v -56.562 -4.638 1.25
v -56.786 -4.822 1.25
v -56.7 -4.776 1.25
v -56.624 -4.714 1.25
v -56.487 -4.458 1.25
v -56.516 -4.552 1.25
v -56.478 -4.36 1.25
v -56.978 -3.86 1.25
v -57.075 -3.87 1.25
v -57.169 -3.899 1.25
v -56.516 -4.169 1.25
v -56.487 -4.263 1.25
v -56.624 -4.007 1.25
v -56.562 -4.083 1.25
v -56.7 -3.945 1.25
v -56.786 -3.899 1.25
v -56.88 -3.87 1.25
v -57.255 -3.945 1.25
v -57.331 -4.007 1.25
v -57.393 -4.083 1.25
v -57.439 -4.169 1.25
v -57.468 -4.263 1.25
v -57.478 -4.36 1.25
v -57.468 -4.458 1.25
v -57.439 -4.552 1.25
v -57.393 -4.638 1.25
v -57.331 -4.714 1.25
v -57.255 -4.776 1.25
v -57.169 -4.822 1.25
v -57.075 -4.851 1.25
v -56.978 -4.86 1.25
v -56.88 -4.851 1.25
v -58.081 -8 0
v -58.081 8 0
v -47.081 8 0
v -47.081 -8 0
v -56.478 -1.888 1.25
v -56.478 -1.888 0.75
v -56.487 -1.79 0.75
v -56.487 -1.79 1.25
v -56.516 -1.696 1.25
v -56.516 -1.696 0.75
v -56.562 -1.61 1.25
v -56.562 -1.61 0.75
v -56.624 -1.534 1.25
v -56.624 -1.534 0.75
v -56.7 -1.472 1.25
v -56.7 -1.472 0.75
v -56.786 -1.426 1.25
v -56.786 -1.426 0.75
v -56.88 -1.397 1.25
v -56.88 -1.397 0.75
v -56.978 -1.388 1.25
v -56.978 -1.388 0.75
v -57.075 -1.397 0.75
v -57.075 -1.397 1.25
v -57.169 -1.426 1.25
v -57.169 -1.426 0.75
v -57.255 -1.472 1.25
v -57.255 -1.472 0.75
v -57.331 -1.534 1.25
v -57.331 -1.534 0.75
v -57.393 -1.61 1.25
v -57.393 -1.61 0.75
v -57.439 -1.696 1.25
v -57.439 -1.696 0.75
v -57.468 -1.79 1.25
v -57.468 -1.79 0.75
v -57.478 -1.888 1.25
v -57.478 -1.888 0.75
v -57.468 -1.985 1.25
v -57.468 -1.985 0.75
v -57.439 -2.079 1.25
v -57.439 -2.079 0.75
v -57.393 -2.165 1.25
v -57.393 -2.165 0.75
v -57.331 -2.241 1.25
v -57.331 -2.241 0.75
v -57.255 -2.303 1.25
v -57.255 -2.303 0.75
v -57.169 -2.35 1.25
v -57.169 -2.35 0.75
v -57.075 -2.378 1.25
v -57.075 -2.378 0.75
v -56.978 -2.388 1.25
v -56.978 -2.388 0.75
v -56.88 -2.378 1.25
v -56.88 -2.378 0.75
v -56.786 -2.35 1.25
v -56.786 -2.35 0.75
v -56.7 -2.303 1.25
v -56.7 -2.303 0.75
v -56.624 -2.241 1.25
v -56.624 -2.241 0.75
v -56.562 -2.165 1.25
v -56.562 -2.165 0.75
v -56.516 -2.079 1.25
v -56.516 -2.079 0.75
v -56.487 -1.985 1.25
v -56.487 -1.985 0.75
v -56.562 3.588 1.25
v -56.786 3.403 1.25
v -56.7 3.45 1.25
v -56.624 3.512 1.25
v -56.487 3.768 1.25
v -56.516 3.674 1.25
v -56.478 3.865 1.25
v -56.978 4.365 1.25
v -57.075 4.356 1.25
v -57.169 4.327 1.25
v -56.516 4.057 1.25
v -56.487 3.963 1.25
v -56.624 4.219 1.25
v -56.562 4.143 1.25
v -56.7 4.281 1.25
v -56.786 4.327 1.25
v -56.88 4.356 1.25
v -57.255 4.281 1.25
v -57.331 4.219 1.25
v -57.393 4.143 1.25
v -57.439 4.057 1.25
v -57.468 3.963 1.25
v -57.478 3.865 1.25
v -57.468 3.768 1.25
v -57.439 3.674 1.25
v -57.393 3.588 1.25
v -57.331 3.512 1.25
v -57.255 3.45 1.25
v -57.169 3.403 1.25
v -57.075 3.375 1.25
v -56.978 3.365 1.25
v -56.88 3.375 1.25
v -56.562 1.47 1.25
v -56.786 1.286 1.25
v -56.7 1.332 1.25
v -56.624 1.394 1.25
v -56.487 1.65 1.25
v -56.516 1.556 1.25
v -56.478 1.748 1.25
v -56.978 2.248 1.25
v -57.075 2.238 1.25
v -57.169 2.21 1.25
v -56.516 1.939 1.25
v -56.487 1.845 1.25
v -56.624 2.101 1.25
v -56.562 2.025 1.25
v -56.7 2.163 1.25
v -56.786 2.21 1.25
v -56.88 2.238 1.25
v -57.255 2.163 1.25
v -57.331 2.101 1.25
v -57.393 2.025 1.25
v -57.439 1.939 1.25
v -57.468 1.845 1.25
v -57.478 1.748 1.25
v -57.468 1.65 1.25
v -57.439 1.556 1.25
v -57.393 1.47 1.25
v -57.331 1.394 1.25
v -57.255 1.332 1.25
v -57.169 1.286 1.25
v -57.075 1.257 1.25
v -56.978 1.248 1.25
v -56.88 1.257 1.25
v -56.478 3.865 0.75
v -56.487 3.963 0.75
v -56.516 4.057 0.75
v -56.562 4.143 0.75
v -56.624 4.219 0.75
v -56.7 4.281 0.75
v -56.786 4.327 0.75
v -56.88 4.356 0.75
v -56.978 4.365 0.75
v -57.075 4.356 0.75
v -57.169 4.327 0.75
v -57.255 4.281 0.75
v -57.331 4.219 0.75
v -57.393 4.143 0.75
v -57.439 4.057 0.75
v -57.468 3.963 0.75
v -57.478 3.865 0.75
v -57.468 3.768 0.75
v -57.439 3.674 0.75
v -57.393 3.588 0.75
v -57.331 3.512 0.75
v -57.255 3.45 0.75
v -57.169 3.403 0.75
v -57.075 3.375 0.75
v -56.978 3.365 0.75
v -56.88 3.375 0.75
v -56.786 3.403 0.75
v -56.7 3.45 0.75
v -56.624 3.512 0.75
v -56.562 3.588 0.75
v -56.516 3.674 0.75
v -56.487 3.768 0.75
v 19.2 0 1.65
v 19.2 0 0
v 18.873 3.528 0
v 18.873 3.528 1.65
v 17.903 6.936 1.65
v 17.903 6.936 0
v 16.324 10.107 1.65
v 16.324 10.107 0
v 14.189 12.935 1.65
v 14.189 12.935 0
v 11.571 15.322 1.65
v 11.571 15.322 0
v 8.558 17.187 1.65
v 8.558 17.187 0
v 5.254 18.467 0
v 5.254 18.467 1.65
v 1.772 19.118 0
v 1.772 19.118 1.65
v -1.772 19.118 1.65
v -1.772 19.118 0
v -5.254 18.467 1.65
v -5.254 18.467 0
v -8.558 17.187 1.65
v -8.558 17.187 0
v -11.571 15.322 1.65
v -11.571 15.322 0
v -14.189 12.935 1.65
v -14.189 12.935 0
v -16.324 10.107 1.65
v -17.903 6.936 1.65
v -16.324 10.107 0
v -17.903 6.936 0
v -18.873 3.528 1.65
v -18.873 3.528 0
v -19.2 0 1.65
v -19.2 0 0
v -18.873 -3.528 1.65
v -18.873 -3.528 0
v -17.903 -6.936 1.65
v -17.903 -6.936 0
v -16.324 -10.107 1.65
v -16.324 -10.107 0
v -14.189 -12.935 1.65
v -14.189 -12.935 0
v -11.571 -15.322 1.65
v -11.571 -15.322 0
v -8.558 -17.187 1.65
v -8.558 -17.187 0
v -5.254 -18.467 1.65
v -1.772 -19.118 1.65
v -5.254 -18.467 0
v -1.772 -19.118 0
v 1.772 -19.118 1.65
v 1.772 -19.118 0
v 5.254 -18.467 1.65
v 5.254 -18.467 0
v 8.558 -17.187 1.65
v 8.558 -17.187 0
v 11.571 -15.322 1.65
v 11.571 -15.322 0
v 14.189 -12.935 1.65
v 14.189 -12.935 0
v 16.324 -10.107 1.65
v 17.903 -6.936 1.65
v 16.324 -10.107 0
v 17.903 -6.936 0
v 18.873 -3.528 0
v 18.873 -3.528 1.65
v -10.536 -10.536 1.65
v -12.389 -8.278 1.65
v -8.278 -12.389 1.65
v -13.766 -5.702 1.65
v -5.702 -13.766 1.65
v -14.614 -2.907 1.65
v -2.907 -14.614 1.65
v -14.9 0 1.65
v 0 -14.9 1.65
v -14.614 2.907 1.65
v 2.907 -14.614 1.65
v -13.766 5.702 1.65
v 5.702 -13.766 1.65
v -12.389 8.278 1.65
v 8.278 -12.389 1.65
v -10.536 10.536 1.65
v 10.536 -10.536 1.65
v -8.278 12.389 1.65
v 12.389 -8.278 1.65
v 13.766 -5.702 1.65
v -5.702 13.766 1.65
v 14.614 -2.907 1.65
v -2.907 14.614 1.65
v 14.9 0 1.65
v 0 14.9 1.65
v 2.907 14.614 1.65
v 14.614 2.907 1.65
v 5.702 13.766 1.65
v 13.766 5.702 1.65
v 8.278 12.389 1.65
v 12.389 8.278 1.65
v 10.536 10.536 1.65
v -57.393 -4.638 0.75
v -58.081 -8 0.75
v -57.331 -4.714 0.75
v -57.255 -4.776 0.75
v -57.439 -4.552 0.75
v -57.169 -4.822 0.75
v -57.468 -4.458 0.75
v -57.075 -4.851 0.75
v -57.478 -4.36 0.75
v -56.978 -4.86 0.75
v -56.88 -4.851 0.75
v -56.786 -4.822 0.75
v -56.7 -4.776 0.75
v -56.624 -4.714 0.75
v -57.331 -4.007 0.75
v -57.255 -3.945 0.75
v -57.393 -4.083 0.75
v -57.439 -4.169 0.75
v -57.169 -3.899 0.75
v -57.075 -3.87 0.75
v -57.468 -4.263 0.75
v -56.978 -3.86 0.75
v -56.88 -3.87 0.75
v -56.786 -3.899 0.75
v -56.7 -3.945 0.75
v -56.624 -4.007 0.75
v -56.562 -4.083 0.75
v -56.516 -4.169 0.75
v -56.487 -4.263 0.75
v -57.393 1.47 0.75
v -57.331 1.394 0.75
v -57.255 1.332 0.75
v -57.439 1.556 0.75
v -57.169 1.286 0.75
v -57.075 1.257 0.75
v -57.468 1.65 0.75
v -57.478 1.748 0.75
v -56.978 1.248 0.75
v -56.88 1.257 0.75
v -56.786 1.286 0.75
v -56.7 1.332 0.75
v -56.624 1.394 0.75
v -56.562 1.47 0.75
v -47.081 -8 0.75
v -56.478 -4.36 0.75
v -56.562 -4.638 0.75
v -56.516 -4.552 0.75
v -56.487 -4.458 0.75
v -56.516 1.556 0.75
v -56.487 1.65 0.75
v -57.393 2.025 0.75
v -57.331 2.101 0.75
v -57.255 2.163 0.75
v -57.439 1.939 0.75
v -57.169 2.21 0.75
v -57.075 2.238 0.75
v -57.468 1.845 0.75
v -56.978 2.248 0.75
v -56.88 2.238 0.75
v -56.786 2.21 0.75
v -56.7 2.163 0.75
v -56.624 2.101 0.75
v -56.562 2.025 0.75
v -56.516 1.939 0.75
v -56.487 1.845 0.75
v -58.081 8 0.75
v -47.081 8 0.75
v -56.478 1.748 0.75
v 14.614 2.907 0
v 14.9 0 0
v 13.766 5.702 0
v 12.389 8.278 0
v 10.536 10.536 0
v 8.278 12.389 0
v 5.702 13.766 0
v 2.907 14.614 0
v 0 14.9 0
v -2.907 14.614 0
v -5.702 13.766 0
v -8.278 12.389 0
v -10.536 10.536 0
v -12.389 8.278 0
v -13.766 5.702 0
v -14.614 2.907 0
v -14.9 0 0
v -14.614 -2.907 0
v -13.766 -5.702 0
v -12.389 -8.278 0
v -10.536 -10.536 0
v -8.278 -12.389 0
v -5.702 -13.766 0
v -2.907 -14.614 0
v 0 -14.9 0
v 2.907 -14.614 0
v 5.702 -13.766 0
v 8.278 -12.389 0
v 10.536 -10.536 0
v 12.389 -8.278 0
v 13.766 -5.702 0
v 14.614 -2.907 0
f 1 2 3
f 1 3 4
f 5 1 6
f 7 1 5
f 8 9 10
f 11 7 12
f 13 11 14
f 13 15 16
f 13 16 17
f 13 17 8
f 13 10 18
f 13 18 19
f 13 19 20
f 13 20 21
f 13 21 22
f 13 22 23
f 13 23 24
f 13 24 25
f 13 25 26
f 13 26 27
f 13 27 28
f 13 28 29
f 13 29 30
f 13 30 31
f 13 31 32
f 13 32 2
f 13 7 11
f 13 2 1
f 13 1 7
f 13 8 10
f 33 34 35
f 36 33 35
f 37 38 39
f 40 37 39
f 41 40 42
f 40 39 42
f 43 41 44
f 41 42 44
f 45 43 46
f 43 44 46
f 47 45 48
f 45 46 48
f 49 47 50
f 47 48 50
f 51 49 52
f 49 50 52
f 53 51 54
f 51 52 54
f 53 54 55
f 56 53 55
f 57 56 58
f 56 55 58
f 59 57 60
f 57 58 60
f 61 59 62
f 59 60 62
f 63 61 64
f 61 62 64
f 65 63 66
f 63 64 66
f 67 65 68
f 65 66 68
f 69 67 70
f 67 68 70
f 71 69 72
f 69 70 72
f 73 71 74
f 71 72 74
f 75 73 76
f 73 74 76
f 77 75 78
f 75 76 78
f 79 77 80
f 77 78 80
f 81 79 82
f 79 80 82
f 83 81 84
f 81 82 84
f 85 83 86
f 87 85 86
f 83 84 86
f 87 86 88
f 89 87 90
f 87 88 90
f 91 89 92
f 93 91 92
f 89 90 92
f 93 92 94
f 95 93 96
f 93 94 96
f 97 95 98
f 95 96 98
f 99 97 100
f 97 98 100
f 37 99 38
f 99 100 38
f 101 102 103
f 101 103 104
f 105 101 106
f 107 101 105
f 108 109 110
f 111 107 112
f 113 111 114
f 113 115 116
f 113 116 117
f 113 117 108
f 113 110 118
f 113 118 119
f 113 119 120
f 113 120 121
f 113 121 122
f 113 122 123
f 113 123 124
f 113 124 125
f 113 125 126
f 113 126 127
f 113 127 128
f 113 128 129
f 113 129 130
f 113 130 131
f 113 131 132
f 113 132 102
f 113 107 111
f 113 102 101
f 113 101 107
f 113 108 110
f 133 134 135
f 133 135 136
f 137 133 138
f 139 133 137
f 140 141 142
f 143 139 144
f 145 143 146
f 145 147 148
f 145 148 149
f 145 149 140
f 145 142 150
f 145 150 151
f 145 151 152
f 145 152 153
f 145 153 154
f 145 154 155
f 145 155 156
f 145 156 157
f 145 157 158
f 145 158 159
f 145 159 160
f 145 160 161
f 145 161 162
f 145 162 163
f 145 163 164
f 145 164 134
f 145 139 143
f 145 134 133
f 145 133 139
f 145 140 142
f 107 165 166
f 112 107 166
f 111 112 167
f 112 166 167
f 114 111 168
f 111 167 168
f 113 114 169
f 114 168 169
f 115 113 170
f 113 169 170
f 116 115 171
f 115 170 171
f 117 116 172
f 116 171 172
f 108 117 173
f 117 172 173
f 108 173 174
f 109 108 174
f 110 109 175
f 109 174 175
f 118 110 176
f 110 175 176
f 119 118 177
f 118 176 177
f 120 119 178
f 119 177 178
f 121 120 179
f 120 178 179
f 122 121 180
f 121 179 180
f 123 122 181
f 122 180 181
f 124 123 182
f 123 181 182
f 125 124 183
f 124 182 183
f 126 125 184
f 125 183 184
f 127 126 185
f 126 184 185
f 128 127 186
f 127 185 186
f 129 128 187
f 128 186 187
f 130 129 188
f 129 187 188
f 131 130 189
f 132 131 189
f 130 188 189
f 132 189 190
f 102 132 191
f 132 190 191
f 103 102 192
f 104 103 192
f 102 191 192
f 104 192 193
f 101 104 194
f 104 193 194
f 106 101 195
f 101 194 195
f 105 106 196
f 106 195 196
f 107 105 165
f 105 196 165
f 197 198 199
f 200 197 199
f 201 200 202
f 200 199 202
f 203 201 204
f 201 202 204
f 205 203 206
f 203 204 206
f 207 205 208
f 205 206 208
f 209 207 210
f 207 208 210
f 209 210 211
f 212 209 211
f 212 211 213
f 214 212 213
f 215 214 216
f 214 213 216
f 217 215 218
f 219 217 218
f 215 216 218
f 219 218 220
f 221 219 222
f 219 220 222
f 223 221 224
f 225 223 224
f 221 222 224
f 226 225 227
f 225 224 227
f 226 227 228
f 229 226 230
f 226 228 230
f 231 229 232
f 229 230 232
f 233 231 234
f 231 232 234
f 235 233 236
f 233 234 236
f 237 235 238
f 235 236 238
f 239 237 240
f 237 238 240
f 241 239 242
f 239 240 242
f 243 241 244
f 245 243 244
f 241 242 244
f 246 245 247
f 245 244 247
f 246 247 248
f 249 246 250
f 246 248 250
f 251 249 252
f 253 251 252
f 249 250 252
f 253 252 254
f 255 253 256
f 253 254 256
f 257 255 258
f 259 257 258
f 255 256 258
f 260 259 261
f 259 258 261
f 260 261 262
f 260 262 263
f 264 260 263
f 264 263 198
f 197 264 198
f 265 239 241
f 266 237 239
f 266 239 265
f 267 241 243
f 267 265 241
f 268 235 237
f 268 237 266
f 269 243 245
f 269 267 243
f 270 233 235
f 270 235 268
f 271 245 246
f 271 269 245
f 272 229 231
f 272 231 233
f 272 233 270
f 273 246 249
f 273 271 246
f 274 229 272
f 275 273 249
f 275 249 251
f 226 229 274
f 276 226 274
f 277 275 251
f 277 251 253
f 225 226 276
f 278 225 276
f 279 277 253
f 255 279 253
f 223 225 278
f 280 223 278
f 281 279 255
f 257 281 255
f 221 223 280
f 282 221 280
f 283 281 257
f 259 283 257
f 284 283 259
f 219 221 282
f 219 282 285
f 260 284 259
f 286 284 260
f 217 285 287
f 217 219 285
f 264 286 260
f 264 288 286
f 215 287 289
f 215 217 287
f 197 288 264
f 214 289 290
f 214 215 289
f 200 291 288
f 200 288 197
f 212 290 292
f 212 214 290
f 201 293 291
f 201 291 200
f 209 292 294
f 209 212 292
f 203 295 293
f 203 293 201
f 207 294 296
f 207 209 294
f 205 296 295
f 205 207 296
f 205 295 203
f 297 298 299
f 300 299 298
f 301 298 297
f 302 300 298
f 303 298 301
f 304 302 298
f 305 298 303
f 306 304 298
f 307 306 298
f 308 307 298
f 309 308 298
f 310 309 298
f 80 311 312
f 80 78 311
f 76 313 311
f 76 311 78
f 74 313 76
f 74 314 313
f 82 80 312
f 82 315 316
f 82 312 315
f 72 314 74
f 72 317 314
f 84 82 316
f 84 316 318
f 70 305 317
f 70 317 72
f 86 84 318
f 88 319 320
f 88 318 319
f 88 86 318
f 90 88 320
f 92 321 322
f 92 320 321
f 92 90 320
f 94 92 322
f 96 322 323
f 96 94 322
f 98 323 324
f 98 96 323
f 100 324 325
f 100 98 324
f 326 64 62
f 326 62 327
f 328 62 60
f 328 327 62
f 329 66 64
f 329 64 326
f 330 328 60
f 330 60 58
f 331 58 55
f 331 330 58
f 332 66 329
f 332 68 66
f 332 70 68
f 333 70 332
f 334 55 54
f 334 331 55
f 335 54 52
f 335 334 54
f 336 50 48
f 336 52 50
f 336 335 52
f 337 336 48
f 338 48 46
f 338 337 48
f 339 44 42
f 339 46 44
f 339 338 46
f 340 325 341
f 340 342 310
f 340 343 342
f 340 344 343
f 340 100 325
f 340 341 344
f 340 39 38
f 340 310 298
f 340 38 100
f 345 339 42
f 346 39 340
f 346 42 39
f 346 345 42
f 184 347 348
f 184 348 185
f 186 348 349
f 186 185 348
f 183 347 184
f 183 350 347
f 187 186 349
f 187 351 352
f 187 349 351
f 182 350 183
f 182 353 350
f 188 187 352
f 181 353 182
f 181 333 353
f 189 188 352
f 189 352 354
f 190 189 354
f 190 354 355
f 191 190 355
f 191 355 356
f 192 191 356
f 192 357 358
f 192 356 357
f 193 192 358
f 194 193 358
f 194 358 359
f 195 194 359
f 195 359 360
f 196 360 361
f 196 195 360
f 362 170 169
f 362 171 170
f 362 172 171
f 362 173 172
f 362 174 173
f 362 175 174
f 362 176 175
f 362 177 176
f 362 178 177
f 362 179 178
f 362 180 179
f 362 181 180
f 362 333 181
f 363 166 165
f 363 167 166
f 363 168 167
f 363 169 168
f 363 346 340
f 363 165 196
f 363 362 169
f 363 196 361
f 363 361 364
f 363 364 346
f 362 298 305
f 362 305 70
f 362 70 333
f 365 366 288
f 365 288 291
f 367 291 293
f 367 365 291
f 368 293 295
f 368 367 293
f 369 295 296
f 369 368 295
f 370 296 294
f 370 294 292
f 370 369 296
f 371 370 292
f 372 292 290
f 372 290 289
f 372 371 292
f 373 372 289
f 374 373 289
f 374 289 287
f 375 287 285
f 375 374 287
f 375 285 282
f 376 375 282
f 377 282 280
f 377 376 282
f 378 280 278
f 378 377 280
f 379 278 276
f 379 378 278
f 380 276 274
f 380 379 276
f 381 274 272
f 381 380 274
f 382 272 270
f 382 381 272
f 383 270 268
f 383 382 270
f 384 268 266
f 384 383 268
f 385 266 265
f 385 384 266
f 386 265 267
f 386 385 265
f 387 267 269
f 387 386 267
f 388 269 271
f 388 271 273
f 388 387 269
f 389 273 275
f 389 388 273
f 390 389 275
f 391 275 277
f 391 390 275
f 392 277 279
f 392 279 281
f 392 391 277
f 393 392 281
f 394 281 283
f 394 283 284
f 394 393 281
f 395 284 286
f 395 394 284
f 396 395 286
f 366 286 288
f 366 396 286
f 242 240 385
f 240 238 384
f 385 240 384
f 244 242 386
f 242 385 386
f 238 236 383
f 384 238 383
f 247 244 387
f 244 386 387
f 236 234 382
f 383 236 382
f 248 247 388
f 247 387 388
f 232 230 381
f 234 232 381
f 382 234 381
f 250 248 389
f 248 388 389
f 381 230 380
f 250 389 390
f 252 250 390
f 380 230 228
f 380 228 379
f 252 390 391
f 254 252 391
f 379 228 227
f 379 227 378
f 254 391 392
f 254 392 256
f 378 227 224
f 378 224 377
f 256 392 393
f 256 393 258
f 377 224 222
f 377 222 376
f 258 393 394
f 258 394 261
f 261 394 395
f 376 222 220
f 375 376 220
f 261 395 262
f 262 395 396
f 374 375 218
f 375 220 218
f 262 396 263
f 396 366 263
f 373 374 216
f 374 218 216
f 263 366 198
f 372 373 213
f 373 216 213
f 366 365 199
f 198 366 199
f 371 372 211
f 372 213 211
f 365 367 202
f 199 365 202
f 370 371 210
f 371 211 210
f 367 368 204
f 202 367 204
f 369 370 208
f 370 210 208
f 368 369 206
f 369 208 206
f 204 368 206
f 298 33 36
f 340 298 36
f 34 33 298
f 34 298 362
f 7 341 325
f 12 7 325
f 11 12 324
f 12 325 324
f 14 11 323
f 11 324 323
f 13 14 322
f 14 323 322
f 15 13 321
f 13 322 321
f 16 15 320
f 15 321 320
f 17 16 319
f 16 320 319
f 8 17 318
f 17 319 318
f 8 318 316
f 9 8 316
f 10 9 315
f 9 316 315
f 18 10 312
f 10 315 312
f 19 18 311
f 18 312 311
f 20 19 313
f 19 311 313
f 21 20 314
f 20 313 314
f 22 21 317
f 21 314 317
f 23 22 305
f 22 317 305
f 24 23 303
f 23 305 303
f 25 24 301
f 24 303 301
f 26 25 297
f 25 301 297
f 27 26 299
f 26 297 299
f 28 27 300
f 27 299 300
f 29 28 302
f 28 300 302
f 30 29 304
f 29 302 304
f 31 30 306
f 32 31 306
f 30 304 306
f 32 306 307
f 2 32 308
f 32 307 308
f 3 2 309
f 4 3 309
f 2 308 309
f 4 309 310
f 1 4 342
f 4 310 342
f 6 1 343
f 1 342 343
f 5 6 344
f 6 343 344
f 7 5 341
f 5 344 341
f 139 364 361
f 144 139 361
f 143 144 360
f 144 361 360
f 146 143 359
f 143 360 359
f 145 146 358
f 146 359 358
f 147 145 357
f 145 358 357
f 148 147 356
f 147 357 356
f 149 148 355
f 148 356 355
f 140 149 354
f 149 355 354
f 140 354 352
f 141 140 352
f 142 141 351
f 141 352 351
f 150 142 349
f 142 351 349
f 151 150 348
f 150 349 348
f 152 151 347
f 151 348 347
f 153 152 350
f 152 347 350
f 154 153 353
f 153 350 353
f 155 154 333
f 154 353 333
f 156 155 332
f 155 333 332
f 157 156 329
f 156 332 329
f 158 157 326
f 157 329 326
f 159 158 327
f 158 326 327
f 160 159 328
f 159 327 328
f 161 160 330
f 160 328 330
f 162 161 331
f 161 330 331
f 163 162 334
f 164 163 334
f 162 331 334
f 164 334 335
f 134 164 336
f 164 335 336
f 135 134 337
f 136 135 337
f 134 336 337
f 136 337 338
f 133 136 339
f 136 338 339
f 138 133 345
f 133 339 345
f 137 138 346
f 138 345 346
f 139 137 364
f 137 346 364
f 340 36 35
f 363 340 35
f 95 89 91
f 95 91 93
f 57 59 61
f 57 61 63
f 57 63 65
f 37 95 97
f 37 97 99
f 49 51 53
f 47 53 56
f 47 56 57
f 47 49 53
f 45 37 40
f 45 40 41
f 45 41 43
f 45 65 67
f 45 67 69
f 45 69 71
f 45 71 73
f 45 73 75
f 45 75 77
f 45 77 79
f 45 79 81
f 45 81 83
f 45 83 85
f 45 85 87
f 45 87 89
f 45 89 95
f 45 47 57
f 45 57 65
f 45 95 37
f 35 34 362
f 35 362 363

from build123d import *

# Parameters (mm, degrees)
F0_R     = 19.2
F0_R_2   = 14.9
F1_DEPTH = 1.65
F2_W     = 11
F2_H     = 16
F3_DEPTH = 0.75
F4_R     = 0.5
F5_DEPTH = 0.5


with BuildPart() as f1:
    # F0 (on Top) → F1 (new body)
    with BuildSketch(Plane.XY):
        Circle(F0_R)
        Circle(F0_R_2, mode=Mode.SUBTRACT)
    extrude(amount=F1_DEPTH)


with BuildPart() as f3:
    # F2 (on Top) → F3 (new body)
    with BuildSketch(Plane.XY):
        with Locations((-52.580937, 0)):
            Rectangle(F2_W, F2_H)
    extrude(amount=F3_DEPTH)

    # F4 (on face) → F5 (join)
    with BuildSketch(Plane.XY.offset(0.75)):
        with Locations((-56.977503, 3.865334)):
            Circle(F4_R)
        with Locations((-56.977503, 1.747658)):
            Circle(F4_R)
        with Locations((-56.977503, -1.887582)):
            Circle(F4_R)
        with Locations((-56.977503, -4.3605)):
            Circle(F4_R)
    extrude(amount=F5_DEPTH)


solid = Compound([f1.part, f3.part])
